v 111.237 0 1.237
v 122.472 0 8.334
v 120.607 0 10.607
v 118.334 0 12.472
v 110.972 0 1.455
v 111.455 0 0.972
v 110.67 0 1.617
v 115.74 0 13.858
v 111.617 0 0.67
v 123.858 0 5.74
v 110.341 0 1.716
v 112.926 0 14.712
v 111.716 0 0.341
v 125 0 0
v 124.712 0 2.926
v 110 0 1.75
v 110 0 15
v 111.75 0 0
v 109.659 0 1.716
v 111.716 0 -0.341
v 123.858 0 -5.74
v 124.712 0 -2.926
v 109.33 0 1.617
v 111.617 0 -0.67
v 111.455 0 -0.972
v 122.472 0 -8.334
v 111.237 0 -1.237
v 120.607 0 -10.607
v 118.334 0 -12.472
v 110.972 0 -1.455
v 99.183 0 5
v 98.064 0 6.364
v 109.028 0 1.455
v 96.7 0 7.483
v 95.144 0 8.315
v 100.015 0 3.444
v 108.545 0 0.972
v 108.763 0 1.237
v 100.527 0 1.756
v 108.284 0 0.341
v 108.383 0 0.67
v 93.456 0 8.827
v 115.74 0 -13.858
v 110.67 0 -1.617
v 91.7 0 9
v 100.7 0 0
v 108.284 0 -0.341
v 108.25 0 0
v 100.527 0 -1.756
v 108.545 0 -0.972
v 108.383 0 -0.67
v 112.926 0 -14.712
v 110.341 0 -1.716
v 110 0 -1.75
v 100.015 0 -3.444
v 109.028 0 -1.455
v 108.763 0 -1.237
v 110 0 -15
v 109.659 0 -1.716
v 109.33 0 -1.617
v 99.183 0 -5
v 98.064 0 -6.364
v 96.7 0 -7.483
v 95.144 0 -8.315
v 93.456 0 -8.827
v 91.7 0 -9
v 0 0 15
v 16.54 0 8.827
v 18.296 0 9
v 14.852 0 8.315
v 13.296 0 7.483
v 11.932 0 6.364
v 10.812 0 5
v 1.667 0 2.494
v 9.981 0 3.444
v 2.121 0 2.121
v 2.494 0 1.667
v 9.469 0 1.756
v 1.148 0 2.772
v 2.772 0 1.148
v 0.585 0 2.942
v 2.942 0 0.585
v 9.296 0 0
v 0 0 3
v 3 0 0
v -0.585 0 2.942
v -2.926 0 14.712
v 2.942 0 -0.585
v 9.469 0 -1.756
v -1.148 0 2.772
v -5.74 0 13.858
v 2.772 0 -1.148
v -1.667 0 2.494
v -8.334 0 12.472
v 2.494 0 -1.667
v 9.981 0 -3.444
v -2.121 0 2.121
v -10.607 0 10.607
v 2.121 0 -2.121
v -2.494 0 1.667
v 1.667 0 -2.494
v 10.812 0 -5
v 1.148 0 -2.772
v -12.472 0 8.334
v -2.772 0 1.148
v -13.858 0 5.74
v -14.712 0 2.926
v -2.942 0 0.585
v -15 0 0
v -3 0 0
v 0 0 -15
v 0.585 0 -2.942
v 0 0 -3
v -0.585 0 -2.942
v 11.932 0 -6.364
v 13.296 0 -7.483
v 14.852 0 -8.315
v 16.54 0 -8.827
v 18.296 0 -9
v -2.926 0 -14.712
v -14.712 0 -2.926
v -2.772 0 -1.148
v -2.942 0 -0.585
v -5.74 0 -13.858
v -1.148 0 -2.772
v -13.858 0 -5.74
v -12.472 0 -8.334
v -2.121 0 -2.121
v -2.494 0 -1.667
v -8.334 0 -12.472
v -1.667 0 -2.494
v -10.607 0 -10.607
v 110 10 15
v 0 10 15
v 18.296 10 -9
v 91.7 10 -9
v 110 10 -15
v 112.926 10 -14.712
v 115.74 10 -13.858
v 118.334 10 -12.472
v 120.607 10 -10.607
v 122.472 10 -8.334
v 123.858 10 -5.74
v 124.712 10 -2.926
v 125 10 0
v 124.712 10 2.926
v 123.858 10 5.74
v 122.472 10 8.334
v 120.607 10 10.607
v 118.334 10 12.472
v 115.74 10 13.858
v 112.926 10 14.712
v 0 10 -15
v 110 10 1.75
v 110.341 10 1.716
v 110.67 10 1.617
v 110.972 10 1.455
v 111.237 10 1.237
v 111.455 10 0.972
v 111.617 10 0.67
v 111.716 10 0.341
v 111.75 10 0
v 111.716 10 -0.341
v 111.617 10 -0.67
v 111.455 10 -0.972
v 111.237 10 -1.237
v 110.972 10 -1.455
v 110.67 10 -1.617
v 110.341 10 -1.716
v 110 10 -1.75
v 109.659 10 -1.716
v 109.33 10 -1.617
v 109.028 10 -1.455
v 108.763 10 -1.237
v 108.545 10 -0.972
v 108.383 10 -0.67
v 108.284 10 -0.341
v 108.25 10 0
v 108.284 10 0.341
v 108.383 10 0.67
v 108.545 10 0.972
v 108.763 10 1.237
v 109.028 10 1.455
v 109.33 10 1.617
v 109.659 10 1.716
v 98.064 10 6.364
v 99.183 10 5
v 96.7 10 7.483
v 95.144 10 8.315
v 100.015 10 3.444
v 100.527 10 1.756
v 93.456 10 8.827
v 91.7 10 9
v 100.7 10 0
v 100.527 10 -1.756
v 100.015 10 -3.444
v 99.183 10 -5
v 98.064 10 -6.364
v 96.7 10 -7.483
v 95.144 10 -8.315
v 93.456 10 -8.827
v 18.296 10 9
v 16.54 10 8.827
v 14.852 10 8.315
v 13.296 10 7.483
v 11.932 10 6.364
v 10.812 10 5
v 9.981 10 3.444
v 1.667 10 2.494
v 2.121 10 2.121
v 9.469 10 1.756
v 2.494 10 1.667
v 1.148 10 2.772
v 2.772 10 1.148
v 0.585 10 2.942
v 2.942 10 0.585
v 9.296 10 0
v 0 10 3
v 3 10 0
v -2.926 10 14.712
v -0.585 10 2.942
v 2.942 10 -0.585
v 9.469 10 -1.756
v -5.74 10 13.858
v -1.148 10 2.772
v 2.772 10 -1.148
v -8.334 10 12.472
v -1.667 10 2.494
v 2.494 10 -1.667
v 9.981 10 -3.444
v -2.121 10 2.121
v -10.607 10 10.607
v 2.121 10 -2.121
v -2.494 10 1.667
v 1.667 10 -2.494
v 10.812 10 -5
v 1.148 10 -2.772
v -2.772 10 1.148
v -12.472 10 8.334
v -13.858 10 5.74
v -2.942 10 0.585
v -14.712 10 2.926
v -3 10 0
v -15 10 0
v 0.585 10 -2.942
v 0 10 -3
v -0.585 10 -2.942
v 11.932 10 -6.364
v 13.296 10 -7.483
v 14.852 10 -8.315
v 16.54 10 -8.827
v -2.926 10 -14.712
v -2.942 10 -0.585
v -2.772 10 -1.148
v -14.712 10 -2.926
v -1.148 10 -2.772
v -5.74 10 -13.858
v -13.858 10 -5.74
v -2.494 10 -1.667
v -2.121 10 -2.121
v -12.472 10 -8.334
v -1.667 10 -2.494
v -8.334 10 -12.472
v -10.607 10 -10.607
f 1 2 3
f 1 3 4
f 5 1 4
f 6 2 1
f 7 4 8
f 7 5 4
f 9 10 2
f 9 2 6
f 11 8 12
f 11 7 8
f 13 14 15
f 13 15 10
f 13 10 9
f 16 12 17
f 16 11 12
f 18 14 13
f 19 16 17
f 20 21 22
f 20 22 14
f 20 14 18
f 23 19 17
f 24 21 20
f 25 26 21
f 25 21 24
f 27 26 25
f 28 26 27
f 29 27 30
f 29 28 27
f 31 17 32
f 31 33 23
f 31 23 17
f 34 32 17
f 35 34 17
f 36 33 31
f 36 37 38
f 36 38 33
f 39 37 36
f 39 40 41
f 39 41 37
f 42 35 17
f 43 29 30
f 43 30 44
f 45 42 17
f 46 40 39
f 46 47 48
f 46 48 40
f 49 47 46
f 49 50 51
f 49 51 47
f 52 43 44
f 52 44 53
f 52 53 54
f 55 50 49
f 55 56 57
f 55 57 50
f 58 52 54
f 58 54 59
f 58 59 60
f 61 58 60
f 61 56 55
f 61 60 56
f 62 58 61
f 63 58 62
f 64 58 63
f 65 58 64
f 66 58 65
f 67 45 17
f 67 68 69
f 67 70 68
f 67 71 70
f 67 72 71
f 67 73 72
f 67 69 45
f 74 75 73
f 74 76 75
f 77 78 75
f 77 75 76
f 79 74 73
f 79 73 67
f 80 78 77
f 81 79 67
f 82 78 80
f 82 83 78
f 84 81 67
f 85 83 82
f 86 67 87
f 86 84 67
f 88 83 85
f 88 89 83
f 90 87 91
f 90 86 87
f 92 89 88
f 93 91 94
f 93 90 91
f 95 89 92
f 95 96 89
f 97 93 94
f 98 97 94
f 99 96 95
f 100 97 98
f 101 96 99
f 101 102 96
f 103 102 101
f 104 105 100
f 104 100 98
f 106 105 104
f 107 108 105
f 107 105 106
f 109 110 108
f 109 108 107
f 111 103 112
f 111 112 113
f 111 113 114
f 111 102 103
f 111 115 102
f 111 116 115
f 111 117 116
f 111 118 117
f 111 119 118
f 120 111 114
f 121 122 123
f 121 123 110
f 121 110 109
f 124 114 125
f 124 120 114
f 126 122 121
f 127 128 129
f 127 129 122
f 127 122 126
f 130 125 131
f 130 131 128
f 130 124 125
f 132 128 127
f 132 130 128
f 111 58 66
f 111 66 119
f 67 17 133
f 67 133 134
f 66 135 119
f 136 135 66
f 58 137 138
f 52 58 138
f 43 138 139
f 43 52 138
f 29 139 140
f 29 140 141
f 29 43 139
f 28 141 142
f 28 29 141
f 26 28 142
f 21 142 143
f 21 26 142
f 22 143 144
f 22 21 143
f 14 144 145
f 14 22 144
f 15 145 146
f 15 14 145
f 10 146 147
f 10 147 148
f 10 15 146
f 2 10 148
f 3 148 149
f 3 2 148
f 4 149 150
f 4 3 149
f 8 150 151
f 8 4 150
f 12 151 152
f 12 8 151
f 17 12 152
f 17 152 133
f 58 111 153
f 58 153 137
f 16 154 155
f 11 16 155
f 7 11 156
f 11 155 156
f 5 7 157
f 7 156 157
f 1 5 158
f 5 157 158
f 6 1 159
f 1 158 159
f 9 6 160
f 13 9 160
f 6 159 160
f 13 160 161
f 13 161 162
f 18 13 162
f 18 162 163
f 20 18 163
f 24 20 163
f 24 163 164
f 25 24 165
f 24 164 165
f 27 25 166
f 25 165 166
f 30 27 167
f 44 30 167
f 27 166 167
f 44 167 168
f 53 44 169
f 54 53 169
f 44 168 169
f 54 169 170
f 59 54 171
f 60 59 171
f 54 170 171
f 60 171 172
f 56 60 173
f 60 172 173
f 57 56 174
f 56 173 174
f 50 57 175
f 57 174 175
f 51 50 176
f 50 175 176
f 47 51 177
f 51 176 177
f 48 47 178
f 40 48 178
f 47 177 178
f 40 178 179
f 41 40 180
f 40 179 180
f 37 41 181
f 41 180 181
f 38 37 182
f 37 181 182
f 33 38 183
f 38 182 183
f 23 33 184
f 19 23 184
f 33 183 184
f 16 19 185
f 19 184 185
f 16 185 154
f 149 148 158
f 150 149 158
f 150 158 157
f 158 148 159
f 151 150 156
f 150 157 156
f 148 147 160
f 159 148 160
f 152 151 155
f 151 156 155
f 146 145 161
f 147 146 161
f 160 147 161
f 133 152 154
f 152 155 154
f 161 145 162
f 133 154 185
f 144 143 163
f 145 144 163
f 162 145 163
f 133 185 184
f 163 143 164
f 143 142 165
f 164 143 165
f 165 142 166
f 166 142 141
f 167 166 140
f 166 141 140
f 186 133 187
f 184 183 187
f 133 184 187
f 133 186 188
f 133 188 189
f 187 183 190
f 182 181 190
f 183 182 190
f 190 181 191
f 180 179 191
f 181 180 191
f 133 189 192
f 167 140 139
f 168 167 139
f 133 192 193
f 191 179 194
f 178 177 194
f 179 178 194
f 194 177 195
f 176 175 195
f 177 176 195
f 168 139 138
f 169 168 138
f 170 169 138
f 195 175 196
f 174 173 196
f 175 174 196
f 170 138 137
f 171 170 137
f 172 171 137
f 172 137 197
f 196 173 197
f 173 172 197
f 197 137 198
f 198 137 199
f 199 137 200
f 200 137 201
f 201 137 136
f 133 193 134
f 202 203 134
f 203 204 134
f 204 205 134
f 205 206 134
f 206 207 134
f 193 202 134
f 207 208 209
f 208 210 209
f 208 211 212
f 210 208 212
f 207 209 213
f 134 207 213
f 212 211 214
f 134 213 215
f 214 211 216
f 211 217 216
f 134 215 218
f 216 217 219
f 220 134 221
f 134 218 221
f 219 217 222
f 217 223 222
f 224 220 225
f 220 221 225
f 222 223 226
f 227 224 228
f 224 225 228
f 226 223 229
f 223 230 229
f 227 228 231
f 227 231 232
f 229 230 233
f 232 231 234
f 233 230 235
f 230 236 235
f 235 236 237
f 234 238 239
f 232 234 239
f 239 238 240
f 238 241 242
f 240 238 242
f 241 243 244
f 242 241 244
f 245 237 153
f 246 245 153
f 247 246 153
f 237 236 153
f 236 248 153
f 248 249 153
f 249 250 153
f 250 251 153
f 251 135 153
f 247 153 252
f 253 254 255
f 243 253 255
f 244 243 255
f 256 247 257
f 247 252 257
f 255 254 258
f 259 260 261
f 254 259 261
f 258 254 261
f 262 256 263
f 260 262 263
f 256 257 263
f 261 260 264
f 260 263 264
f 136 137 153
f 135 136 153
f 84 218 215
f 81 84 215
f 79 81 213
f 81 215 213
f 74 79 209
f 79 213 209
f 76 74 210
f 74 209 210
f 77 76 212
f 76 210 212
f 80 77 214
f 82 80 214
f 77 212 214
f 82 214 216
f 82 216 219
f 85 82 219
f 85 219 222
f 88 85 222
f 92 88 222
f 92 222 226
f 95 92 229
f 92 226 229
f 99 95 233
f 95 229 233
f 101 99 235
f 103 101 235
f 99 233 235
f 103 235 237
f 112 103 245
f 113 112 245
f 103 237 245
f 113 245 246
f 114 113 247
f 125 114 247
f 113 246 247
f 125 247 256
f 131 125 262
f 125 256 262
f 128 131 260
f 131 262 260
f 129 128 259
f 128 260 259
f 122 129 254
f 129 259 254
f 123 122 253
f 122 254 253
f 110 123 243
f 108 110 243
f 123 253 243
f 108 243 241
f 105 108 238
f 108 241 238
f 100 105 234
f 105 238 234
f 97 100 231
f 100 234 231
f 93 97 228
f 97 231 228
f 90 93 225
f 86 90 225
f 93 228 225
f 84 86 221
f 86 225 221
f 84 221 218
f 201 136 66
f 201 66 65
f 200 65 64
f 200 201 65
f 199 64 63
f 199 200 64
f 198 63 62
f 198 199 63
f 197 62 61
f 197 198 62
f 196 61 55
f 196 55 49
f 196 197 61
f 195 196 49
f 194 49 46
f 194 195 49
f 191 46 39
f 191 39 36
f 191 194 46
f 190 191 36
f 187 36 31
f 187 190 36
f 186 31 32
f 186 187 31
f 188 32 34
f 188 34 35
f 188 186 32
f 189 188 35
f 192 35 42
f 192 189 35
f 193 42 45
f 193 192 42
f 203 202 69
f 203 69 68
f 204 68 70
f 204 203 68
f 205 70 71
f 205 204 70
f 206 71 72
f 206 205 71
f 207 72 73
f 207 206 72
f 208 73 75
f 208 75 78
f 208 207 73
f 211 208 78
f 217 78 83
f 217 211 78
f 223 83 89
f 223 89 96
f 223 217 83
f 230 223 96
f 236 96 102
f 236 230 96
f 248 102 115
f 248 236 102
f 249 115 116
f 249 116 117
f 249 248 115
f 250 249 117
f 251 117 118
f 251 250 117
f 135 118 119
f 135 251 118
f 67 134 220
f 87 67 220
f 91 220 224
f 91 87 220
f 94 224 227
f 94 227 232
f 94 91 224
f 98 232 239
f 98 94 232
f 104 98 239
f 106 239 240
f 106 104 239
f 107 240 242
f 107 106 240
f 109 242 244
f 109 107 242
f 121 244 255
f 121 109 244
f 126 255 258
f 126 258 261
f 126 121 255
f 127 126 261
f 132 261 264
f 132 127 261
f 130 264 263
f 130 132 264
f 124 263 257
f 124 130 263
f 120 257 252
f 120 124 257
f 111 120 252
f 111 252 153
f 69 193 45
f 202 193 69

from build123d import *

# Parameters (mm, degrees)
SKETCH2_R           = 1.45
SKETCH2_R_2         = 1.5
BOSS_EXTRUDE1_DEPTH = 10
SKETCH3_R           = 2.925
CUT_EXTRUDE1_DEPTH  = 2
CUT_EXTRUDE2_DEPTH  = 10
SKETCH5_R           = 3
CUT_EXTRUDE3_DEPTH  = 10
SKETCH6_R           = 1.75
CUT_EXTRUDE4_DEPTH  = 10


with BuildPart() as part:
    # Sketch2 → Boss-Extrude1 (new body)
    with BuildSketch(Plane(origin=(0, 0, 0), x_dir=(1, 0, 0), z_dir=(0, 1, 0))):
        with BuildLine():
            Line((0, 15), (110, 15))
            ThreePointArc((110, 15), (125, 0), (110, -15))
            Line((110, -15), (0, -15))
            ThreePointArc((0, -15), (-15, 0), (0, 15))
        make_face()
        with Locations(Location((0, 0, 0), (0, 0, 270))):
            Circle(SKETCH2_R, mode=Mode.SUBTRACT)
        with Locations(Location((110, 0, 0), (0, 0, 270))):
            Circle(SKETCH2_R_2, mode=Mode.SUBTRACT)
    extrude(amount=BOSS_EXTRUDE1_DEPTH)

    # Sketch3 → Cut-Extrude1 (cut)
    with BuildSketch(Plane(origin=(0, 10, 0), x_dir=(1, 0, 0), z_dir=(0, 1, 0))):
        with Locations(Location((0, 0, 0), (0, 0, 270))):
            Circle(SKETCH3_R)
    extrude(amount=-CUT_EXTRUDE1_DEPTH, mode=Mode.SUBTRACT)

    # Sketch4 → Cut-Extrude2 (cut)
    with BuildSketch(Plane(origin=(0, 10, 0), x_dir=(1, 0, 0), z_dir=(0, 1, 0))):
        with BuildLine():
            Line((18.295710574, 9), (91.7, 9))
            ThreePointArc((91.7, 9), (100.7, 0), (91.7, -9))
            Line((91.7, -9), (18.295710574, -9))
            ThreePointArc((18.295710574, -9), (9.295710574, 0), (18.295710574, 9))
        make_face()
    extrude(amount=-CUT_EXTRUDE2_DEPTH, mode=Mode.SUBTRACT)

    # Sketch5 → Cut-Extrude3 (cut)
    with BuildSketch(Plane(origin=(0, 10, 0), x_dir=(1, 0, 0), z_dir=(0, 1, 0))):
        with Locations(Location((0, 0, 0), (0, 0, 270))):
            Circle(SKETCH5_R)
    extrude(amount=-CUT_EXTRUDE3_DEPTH, mode=Mode.SUBTRACT)

    # Sketch6 → Cut-Extrude4 (cut)
    with BuildSketch(Plane(origin=(0, 10, 0), x_dir=(1, 0, 0), z_dir=(0, 1, 0))):
        with Locations(Location((110, 0, 0), (0, 0, 270))):
            Circle(SKETCH6_R)
    extrude(amount=-CUT_EXTRUDE4_DEPTH, mode=Mode.SUBTRACT)


solid = part.part
